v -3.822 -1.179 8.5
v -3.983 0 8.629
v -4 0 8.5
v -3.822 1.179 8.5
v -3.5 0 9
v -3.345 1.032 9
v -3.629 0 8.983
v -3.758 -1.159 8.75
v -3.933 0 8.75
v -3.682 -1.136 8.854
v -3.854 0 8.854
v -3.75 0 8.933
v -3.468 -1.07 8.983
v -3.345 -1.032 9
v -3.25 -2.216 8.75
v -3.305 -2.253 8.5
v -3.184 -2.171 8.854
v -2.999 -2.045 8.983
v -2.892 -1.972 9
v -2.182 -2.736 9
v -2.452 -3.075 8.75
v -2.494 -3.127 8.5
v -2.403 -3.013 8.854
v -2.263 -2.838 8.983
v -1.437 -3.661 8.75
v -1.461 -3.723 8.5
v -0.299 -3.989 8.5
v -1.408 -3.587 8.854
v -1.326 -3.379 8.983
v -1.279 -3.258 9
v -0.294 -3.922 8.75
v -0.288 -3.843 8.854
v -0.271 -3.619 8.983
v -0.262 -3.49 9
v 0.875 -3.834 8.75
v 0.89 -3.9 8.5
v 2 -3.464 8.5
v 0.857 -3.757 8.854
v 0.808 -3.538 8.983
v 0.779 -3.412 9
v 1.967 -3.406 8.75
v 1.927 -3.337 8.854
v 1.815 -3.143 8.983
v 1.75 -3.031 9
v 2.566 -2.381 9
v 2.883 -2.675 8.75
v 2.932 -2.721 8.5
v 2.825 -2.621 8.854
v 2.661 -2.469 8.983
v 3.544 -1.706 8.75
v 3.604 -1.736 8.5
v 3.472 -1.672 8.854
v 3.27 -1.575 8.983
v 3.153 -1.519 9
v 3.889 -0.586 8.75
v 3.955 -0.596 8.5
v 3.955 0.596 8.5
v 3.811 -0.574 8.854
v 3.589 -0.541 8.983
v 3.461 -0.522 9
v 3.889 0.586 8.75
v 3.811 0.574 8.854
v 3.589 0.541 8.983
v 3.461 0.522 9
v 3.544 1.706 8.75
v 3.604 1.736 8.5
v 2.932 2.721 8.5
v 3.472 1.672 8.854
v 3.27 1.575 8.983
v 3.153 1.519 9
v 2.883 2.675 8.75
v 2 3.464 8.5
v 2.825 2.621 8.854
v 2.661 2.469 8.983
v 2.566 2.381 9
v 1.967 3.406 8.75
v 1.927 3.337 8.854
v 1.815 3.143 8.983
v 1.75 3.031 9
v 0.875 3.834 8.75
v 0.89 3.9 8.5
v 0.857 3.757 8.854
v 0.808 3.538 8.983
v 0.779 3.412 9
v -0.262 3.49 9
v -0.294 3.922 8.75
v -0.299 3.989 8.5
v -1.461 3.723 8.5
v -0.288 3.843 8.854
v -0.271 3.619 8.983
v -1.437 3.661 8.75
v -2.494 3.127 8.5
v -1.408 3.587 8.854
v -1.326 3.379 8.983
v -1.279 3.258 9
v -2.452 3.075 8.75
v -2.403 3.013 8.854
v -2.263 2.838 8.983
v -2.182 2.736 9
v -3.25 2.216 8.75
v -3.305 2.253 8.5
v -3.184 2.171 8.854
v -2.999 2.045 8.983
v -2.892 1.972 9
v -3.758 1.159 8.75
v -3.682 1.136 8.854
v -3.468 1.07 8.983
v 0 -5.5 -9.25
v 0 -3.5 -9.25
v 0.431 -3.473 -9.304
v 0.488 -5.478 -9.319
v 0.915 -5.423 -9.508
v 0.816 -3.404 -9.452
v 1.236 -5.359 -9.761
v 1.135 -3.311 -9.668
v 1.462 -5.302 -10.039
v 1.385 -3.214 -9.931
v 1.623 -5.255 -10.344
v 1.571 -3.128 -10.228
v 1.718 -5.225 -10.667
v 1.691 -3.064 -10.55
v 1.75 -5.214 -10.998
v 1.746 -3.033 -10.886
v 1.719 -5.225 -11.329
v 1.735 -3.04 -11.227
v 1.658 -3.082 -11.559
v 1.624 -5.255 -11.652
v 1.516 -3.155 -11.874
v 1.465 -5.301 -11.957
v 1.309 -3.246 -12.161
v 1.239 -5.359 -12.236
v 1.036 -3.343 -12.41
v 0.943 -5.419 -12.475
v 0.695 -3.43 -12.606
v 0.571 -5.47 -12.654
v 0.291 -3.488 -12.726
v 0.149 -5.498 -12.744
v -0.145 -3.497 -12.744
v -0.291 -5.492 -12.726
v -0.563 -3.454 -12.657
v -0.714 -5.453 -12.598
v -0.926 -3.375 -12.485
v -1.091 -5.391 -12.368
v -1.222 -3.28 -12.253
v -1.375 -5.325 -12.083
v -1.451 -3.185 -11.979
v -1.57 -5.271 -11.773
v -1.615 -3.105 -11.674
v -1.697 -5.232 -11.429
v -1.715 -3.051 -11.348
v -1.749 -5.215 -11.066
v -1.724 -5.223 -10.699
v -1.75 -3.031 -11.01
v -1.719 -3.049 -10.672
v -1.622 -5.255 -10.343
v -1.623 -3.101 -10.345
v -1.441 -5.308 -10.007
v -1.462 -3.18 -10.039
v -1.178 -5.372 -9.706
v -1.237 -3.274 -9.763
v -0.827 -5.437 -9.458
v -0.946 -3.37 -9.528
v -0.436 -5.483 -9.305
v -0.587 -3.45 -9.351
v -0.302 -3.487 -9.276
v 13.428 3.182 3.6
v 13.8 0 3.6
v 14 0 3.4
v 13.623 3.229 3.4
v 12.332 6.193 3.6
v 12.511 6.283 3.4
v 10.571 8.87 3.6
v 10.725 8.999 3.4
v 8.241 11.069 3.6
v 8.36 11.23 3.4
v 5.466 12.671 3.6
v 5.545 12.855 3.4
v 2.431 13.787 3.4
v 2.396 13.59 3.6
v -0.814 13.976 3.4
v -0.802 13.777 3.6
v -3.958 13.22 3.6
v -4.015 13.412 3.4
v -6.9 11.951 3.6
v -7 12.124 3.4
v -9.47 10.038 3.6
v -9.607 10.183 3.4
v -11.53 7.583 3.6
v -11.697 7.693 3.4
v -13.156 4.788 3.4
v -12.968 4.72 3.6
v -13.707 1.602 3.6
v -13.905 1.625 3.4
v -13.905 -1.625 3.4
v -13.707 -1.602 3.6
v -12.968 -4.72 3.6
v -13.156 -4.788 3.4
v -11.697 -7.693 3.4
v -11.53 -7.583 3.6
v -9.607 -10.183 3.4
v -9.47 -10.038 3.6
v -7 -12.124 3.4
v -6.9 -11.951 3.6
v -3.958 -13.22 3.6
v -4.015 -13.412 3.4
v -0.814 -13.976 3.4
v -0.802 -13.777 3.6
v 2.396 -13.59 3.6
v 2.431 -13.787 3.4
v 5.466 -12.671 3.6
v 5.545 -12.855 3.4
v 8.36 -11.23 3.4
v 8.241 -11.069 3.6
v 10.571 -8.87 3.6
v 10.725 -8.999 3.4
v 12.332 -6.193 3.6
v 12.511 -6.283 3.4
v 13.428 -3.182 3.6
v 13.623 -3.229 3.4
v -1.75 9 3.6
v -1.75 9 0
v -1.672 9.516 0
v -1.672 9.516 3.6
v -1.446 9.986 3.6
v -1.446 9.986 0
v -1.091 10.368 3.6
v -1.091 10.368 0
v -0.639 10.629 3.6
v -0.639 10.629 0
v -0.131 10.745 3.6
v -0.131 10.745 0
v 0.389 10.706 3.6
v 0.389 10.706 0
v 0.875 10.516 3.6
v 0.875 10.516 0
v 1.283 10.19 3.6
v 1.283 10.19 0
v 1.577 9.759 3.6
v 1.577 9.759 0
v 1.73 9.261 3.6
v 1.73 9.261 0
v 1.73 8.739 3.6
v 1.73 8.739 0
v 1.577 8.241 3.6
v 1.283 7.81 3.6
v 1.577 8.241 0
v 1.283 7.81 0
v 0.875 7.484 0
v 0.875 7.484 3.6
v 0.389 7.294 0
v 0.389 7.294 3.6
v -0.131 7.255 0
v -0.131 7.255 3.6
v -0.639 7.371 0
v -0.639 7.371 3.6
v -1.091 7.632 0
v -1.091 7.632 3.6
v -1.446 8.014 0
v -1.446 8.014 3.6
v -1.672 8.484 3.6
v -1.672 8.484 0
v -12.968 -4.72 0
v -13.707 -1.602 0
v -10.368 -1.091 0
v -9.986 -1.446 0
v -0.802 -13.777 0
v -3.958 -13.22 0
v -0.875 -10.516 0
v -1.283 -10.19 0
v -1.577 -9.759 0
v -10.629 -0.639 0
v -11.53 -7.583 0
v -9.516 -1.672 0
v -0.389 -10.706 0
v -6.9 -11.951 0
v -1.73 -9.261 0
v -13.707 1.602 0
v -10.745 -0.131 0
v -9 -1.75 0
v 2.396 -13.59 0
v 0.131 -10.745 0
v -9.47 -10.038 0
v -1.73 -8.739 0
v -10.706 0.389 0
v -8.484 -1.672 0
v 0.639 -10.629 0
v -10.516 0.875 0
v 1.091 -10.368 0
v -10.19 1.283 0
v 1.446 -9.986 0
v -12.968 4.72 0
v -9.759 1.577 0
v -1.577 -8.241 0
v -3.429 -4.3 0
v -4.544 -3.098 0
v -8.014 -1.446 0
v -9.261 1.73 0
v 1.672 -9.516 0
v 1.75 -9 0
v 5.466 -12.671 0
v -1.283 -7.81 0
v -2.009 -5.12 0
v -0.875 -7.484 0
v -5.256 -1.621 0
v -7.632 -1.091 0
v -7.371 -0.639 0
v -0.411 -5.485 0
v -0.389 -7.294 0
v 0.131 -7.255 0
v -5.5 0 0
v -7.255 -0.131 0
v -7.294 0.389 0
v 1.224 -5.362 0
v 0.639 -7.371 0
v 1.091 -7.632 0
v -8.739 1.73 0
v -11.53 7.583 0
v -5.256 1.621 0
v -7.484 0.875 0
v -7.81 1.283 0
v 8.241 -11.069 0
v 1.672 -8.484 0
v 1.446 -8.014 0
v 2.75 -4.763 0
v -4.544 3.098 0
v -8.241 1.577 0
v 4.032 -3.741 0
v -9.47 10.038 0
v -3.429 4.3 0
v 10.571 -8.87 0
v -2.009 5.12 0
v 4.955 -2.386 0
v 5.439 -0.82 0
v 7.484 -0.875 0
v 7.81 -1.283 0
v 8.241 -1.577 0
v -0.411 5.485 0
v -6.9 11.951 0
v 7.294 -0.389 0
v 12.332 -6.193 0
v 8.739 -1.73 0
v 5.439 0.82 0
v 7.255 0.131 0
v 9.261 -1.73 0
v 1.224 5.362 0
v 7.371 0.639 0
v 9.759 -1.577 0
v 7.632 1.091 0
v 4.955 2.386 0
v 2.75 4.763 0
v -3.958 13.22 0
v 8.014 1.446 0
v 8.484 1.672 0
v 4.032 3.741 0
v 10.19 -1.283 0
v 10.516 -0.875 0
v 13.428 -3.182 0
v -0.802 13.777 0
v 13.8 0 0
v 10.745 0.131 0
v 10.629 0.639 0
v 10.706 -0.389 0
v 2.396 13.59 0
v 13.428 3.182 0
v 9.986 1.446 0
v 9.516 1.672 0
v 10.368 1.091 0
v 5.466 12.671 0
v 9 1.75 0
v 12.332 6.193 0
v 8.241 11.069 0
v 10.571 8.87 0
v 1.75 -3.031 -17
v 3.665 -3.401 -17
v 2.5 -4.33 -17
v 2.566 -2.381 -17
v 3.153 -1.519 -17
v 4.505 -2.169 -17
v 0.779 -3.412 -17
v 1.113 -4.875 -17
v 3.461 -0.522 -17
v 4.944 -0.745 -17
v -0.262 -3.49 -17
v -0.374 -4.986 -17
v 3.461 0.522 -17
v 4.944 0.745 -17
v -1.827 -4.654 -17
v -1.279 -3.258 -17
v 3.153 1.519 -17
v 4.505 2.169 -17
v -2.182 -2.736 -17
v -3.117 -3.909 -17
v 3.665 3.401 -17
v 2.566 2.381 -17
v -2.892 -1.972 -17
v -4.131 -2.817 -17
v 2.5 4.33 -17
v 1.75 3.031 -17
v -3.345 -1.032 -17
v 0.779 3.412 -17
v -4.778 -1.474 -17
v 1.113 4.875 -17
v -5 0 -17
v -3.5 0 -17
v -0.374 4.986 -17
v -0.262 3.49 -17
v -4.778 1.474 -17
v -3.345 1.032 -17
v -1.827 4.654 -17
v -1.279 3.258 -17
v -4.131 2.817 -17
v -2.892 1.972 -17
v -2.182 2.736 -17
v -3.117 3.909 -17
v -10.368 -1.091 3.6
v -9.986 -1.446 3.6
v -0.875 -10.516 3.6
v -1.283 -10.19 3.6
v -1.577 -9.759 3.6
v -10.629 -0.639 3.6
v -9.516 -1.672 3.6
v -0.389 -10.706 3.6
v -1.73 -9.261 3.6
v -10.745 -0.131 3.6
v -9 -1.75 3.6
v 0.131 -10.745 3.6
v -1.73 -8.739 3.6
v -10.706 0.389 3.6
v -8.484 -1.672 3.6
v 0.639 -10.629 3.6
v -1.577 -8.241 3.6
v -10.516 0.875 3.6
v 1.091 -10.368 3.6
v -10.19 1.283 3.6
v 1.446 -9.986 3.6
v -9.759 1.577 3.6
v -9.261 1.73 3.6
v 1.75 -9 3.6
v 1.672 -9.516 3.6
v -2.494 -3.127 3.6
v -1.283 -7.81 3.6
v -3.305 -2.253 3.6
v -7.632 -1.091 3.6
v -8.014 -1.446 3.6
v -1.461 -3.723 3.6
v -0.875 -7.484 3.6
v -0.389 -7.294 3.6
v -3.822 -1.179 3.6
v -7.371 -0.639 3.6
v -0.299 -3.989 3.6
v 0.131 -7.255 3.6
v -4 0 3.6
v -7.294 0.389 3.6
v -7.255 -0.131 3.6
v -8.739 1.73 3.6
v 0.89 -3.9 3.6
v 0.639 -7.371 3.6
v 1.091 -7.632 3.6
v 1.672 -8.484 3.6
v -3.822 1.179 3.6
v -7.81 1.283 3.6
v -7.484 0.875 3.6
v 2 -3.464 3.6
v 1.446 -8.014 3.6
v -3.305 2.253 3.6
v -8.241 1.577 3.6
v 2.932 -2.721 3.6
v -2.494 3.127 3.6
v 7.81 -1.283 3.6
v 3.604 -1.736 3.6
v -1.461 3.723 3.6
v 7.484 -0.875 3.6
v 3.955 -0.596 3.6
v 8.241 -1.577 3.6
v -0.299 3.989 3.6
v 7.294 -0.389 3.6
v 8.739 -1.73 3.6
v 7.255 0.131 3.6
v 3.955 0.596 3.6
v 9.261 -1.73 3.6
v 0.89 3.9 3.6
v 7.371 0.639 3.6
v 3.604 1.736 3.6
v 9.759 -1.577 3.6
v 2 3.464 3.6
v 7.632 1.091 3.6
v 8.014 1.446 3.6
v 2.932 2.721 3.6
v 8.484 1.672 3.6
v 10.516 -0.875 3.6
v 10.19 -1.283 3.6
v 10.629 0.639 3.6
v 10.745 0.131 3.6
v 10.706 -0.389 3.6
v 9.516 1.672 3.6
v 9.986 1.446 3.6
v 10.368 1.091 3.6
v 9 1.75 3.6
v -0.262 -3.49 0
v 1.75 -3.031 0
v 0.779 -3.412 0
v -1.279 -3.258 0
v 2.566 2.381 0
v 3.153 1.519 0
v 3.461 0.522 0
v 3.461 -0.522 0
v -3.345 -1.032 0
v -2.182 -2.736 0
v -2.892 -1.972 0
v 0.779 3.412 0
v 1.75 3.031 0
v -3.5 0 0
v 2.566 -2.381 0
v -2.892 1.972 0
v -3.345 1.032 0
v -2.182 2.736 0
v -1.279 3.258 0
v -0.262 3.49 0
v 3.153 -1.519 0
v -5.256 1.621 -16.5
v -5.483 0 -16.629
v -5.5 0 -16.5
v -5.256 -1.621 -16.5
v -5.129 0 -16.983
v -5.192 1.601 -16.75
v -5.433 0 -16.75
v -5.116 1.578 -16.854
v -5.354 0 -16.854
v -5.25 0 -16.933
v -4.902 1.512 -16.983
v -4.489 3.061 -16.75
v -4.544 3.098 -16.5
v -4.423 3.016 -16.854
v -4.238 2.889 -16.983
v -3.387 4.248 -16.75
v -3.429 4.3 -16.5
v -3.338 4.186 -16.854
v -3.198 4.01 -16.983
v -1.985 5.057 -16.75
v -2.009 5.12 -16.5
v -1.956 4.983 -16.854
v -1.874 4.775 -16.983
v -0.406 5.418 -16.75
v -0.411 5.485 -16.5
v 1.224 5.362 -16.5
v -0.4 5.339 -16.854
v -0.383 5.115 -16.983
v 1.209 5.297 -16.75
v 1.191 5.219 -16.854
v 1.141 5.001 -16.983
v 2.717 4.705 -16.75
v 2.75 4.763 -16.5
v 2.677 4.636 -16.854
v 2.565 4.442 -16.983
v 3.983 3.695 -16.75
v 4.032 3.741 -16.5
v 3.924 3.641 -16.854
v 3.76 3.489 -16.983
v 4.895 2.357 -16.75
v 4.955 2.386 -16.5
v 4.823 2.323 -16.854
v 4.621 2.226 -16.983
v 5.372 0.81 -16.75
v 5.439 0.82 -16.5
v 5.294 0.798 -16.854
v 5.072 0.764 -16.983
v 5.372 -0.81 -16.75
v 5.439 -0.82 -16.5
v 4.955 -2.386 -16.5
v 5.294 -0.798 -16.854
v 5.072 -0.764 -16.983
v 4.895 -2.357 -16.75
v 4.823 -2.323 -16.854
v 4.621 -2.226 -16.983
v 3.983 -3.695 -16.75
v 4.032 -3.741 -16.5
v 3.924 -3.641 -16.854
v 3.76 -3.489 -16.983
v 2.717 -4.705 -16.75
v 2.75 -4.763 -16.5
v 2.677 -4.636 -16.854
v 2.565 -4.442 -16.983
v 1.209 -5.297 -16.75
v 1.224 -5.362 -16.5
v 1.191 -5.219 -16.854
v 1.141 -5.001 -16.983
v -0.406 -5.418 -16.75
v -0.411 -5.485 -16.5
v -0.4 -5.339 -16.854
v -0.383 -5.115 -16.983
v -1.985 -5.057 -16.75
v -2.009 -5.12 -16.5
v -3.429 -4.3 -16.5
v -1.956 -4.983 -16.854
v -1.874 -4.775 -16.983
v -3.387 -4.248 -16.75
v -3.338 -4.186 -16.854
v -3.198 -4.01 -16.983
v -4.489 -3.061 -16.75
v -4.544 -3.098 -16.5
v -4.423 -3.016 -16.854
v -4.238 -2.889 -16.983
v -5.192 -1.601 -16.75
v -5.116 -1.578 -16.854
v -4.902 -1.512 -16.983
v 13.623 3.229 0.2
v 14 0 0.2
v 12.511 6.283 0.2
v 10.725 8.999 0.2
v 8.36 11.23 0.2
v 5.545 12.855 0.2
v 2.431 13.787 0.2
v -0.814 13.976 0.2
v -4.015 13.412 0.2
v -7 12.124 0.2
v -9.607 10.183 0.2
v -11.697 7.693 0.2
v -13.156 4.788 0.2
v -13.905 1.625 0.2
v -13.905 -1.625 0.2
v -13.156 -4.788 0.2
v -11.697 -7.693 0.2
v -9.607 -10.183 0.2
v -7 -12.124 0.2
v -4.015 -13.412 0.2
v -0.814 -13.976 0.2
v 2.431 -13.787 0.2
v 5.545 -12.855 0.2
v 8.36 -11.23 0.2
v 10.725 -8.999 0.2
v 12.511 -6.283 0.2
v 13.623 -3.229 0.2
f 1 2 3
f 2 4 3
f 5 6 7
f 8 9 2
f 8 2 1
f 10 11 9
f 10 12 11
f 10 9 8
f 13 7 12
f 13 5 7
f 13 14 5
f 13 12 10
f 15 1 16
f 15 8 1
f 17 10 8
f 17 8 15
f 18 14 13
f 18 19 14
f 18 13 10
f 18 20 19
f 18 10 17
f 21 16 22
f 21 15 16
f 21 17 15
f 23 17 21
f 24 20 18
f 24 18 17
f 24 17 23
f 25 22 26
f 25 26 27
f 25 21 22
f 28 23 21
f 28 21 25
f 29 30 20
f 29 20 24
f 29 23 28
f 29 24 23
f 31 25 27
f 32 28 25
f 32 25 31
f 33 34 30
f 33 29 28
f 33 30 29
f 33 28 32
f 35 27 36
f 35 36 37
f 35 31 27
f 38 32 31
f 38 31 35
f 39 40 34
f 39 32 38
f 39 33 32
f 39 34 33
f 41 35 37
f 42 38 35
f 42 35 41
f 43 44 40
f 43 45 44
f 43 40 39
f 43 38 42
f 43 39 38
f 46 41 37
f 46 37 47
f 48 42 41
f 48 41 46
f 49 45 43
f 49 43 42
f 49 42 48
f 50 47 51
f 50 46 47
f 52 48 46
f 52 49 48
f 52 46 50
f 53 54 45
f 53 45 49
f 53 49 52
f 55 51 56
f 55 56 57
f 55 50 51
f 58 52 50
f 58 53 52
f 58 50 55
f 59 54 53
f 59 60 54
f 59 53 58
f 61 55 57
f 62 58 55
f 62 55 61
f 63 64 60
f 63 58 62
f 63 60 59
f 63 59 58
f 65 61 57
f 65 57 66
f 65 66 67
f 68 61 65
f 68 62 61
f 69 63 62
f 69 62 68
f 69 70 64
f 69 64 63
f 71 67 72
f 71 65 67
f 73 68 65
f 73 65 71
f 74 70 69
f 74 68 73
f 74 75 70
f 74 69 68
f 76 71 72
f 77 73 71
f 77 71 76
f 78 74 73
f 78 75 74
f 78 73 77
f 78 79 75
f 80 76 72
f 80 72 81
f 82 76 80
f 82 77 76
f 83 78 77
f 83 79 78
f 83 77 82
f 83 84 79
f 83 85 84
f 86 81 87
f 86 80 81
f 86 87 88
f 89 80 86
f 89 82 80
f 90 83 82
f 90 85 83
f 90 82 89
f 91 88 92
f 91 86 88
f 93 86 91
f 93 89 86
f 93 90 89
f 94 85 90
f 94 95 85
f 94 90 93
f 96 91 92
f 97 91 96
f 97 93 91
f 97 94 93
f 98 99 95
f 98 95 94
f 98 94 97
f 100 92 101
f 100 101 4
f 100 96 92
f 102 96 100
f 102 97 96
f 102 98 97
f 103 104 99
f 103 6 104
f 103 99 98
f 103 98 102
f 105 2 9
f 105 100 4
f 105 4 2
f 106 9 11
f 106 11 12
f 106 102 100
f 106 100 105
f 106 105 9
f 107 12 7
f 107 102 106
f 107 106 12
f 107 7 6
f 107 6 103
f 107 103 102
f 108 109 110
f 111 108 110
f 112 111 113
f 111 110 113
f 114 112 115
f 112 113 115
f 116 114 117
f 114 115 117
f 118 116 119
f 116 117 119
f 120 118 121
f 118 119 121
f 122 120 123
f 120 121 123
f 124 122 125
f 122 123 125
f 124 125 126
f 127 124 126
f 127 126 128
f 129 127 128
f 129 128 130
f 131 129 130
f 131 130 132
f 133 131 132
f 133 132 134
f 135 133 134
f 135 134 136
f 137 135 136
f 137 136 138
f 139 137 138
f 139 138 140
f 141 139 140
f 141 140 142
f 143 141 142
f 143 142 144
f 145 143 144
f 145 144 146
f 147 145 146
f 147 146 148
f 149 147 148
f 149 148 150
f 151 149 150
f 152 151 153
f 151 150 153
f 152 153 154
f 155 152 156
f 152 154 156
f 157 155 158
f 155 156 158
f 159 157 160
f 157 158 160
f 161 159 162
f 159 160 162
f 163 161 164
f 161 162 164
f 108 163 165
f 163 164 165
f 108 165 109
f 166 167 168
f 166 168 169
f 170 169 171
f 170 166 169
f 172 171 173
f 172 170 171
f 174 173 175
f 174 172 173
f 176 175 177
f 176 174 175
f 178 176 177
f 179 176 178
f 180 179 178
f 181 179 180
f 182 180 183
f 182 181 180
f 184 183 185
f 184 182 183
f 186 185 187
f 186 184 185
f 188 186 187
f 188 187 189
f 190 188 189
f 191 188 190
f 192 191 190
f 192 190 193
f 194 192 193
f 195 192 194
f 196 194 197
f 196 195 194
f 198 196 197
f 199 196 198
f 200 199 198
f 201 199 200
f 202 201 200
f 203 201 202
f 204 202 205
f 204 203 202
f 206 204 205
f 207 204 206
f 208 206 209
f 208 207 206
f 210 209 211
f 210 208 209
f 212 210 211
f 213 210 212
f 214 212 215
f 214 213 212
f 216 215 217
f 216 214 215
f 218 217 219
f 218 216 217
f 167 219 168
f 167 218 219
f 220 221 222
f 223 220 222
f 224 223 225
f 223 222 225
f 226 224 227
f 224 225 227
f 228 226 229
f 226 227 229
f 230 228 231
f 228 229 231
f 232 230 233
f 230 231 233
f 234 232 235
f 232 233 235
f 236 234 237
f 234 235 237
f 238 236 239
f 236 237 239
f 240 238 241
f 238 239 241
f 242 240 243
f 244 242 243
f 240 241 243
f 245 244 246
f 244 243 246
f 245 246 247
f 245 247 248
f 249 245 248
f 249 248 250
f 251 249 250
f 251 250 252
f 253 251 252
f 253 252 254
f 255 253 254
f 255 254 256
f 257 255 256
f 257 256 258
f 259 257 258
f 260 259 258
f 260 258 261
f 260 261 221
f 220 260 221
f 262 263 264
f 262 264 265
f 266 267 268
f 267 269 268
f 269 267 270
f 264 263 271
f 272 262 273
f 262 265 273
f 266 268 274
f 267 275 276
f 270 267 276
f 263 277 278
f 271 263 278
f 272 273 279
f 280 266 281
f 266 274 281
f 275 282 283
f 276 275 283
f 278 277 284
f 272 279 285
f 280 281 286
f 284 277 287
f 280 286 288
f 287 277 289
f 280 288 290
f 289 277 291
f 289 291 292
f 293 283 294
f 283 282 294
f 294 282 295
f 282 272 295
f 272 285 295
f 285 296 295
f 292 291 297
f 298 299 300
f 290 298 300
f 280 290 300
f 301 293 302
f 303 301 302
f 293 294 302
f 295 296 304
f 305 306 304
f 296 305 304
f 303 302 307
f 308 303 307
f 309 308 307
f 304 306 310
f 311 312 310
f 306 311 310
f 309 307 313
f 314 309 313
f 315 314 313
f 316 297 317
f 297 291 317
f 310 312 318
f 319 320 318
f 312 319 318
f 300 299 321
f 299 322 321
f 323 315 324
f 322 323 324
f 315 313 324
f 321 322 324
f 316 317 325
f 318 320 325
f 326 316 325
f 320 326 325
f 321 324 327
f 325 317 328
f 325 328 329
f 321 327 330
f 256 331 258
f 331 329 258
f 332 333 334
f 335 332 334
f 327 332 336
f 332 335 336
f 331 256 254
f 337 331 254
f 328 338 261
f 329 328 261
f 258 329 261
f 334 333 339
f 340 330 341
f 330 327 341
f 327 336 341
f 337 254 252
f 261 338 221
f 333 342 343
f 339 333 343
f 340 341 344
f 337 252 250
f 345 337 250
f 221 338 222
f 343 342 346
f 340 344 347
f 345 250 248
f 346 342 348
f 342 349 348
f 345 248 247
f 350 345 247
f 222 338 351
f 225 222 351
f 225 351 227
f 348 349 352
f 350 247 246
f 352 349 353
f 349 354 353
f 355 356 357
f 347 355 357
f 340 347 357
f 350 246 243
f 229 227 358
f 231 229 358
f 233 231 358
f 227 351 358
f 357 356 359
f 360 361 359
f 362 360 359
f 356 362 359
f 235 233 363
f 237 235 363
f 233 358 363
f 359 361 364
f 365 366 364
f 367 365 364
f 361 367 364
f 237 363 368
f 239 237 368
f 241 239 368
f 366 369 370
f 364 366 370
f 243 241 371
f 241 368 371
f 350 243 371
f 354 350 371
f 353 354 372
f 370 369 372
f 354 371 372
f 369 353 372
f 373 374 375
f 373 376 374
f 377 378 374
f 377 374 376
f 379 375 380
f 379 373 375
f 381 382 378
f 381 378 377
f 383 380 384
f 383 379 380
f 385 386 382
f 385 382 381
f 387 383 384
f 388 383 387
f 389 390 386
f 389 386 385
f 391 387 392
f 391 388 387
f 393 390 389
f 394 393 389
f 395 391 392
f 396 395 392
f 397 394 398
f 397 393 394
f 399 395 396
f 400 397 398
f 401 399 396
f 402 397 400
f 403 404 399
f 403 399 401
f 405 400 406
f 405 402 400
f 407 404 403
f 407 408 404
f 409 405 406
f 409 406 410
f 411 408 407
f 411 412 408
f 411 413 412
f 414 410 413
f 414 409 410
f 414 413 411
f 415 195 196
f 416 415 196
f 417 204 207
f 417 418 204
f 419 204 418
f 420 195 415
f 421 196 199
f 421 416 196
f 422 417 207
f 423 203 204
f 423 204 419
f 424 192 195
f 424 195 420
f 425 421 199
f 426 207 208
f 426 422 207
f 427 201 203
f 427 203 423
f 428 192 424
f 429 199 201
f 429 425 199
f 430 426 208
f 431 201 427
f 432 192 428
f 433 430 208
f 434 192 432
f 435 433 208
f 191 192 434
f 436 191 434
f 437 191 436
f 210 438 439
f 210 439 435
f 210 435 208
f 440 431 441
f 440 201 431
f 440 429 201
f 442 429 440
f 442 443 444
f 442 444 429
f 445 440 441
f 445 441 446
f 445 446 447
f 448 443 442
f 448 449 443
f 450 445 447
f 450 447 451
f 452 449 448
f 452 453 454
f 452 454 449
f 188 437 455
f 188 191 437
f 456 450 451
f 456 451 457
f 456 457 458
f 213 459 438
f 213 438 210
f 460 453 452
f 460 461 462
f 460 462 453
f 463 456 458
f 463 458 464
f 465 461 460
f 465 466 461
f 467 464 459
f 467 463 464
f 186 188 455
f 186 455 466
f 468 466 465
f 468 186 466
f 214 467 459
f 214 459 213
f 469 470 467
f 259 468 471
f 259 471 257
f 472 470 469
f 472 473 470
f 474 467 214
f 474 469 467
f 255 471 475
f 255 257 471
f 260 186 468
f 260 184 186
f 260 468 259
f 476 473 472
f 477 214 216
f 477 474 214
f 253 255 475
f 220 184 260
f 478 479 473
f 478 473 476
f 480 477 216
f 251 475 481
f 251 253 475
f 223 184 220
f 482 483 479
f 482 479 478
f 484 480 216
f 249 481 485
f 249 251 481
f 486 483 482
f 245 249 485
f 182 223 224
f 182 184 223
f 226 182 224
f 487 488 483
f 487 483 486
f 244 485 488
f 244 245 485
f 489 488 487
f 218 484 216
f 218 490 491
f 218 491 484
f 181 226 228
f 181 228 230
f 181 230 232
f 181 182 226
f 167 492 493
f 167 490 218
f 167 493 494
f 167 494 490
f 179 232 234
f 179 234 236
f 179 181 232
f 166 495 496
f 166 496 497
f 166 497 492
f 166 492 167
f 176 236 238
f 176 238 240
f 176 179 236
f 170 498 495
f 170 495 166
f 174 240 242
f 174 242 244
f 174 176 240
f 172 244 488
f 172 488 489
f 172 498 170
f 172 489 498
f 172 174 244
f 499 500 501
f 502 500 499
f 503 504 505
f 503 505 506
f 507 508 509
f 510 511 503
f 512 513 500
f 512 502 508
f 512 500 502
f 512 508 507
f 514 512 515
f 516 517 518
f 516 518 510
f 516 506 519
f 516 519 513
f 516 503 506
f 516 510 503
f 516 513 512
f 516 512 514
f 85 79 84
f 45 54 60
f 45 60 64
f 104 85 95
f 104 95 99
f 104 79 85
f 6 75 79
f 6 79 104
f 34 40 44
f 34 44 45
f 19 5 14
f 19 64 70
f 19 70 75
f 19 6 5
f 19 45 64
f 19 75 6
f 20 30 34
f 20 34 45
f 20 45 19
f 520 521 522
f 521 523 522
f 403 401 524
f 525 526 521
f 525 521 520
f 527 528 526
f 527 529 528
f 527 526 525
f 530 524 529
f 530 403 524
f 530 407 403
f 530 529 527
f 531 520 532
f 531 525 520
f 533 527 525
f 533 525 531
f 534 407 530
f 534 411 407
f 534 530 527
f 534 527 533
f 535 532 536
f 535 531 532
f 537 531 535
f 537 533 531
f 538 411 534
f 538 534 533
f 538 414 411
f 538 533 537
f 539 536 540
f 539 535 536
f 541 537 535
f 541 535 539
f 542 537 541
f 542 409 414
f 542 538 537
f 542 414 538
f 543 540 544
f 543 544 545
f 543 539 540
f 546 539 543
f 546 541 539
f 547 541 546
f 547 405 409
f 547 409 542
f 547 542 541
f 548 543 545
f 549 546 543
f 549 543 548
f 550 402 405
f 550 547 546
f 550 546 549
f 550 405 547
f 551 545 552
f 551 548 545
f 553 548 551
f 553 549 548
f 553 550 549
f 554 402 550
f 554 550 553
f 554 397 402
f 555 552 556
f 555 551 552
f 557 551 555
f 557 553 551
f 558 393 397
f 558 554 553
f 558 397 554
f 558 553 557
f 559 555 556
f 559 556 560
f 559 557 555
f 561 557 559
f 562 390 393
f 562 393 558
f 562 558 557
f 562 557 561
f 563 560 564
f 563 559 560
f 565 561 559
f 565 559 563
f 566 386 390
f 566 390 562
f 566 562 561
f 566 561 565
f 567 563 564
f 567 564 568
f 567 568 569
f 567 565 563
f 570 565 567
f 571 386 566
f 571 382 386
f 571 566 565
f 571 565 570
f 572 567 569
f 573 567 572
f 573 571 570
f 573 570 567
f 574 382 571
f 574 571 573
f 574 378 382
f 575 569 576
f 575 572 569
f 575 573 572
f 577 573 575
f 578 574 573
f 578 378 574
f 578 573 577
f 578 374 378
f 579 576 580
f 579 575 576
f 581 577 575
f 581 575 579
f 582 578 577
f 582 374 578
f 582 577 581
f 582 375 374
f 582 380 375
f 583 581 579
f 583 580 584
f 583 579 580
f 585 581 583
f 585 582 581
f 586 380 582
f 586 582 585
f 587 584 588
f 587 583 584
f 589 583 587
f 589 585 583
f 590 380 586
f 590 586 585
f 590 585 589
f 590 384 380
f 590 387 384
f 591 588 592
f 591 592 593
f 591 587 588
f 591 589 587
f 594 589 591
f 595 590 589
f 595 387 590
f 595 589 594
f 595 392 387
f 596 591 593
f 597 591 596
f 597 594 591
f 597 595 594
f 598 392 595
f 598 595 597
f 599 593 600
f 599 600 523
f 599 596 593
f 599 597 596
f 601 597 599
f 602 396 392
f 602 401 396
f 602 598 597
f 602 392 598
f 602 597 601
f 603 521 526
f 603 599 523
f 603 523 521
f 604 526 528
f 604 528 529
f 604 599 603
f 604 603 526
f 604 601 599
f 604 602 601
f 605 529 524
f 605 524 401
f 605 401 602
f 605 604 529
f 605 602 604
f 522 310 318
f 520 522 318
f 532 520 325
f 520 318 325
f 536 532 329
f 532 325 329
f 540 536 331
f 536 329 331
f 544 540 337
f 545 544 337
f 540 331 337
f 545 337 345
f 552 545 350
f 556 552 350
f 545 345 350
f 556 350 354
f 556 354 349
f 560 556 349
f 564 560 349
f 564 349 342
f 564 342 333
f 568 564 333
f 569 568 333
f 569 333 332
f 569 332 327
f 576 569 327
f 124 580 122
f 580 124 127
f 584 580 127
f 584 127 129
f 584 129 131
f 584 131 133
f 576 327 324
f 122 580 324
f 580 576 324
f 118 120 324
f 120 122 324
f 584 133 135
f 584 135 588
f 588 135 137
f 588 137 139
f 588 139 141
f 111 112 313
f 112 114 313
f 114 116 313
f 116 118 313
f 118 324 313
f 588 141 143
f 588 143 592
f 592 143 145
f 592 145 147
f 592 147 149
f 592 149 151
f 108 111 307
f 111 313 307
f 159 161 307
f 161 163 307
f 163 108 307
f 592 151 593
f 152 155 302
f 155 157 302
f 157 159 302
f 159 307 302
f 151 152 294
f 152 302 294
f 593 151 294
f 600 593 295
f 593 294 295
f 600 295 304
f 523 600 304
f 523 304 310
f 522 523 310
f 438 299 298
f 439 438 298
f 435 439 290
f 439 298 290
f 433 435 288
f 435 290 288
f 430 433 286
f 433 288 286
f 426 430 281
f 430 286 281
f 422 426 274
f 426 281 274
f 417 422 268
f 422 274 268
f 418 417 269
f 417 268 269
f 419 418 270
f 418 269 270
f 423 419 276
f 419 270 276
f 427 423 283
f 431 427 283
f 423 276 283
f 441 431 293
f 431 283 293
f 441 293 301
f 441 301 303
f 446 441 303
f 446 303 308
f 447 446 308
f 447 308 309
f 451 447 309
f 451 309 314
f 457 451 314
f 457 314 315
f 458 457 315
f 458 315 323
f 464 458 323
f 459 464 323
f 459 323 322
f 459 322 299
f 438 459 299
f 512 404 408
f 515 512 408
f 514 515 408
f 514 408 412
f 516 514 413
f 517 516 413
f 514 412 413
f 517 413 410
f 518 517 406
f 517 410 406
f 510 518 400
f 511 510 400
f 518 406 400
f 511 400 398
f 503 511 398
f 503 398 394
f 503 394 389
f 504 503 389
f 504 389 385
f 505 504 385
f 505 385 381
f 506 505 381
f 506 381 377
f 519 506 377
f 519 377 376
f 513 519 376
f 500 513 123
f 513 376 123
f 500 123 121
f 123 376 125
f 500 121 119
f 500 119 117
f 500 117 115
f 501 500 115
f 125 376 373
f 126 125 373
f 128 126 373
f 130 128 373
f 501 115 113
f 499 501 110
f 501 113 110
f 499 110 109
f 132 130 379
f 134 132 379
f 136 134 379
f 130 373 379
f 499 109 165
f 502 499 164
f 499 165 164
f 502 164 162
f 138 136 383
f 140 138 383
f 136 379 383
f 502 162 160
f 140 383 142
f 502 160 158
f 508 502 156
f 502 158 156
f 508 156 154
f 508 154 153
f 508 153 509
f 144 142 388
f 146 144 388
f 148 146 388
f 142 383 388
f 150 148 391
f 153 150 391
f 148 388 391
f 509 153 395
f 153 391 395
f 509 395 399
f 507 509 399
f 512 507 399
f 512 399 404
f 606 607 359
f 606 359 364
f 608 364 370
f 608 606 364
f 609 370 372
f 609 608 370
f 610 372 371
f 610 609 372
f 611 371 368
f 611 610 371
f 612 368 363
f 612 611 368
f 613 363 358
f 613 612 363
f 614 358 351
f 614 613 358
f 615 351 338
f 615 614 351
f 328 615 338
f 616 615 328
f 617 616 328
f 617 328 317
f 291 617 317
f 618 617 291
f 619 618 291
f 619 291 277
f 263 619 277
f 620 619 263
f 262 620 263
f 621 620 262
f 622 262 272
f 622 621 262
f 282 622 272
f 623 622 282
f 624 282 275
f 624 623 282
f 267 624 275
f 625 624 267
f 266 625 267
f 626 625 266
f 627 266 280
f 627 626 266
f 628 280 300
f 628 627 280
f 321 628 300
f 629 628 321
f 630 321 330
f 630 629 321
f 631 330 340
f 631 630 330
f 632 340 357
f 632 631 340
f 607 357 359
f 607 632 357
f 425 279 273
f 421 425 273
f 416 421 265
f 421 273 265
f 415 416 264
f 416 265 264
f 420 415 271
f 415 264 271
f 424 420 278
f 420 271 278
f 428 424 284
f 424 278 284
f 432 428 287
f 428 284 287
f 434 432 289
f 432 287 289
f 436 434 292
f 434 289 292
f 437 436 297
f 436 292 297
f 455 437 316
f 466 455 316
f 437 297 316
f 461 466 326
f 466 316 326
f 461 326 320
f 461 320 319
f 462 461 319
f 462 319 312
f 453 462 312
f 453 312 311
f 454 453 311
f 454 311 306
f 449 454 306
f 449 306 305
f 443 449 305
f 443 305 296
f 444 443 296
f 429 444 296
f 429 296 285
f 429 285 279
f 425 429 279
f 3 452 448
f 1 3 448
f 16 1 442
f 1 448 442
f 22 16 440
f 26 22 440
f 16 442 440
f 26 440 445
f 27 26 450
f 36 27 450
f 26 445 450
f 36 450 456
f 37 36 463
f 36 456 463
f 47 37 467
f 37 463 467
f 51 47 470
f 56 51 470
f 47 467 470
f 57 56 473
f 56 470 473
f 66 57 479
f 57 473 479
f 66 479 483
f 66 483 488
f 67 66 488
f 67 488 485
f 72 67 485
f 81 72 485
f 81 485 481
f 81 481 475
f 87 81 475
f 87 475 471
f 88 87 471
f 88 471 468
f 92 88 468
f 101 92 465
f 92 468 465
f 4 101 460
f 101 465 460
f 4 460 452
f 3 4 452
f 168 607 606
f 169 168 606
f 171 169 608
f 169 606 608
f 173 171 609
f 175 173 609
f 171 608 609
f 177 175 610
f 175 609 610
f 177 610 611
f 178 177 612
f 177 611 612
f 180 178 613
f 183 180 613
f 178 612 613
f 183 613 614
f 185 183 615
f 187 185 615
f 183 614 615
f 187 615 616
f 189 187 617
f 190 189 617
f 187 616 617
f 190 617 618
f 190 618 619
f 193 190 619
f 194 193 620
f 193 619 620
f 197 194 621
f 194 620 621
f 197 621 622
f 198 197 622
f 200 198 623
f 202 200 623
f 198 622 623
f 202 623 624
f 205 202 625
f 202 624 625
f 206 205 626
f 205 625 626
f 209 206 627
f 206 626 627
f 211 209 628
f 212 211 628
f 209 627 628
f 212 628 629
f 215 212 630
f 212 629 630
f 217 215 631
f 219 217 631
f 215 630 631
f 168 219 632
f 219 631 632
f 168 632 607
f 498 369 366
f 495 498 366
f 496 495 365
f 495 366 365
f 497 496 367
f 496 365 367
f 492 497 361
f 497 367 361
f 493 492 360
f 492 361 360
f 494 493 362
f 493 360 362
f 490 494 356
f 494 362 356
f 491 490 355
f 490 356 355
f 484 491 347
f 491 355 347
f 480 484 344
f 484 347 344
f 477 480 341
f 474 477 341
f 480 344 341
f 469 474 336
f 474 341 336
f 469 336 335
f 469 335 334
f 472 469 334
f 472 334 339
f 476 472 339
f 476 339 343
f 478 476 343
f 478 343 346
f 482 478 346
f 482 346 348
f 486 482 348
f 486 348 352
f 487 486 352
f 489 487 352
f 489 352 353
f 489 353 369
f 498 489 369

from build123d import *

# Parameters (mm, degrees)
SKETCH1_R           = 14
BOSS_EXTRUDE1_DEPTH = 3.6
SKETCH2_R           = 4
BOSS_EXTRUDE2_DEPTH = 5.4
SKETCH3_R           = 5.5
BOSS_EXTRUDE3_DEPTH = 17
SKETCH4_R           = 3.5
CUT_EXTRUDE1_DEPTH  = 17
SKETCH5_R           = 1.75
CUT_EXTRUDE2_DEPTH  = 27.095976701
CIRPATTERN1_COUNT   = 4
SKETCH6_R           = 1.75
CUT_EXTRUDE3_DEPTH  = 27.095976701
FILLET1_R           = 0.5
FILLET2_SIZE        = 0.2


with BuildPart() as part:
    # Sketch1 → Boss-Extrude1 (new body)
    with BuildSketch(Plane.XY):
        Circle(SKETCH1_R)
    extrude(amount=BOSS_EXTRUDE1_DEPTH)

    # Sketch2 → Boss-Extrude2 (add)
    with BuildSketch(Plane.XY.offset(3.6)):
        Circle(SKETCH2_R)
    extrude(amount=BOSS_EXTRUDE2_DEPTH)

    # Sketch3 → Boss-Extrude3 (add)
    with BuildSketch(Plane(origin=(0, 0, 0), x_dir=(-1, 0, 0), z_dir=(0, 0, -1))):
        Circle(SKETCH3_R)
    extrude(amount=BOSS_EXTRUDE3_DEPTH)

    # Sketch4 → Cut-Extrude1 (cut)
    with BuildSketch(Plane(origin=(0, 0, -17), x_dir=(-1, 0, 0), z_dir=(0, 0, -1))):
        Circle(SKETCH4_R)
    extrude(amount=-CUT_EXTRUDE1_DEPTH, mode=Mode.SUBTRACT)

    # Sketch5 → Cut-Extrude2 (cut, through all)
    with BuildSketch(Plane(origin=(0, 0, 0), x_dir=(-1, 0, 0), z_dir=(0, 0, -1))):
        with Locations((0, 9)):
            Circle(SKETCH5_R)
    cut_extrude2 = extrude(amount=-CUT_EXTRUDE2_DEPTH, mode=Mode.SUBTRACT)

    # CirPattern1: Cut-Extrude2 ×4 about axis
    cirpattern1_axis = Axis((0, 0, 0), (0, 0, -1))
    for i in range(1, CIRPATTERN1_COUNT):
        add(cut_extrude2.rotate(cirpattern1_axis, i * 360 / CIRPATTERN1_COUNT), mode=Mode.SUBTRACT)

    # Sketch6 → Cut-Extrude3 (cut, through all)
    with BuildSketch(Plane(origin=(0, 0, 0), x_dir=(1, 0, 0), z_dir=(0, 1, 0))):
        with Locations((0, 11)):
            Circle(SKETCH6_R)
    extrude(amount=-CUT_EXTRUDE3_DEPTH, mode=Mode.SUBTRACT)

    # Fillet1
    fillet1_edges = [part.edges().sort_by_distance(p)[0] for p in [
        (5.5, 0, -17),
        (-4, 0, 9),
    ]]
    fillet(fillet1_edges, radius=FILLET1_R)

    # Fillet2
    fillet2_edges = [part.edges().sort_by_distance(p)[0] for p in [
        (-14, 0, 0),
        (-14, 0, 3.6),
    ]]
    chamfer(fillet2_edges, length=FILLET2_SIZE)


solid = part.part
